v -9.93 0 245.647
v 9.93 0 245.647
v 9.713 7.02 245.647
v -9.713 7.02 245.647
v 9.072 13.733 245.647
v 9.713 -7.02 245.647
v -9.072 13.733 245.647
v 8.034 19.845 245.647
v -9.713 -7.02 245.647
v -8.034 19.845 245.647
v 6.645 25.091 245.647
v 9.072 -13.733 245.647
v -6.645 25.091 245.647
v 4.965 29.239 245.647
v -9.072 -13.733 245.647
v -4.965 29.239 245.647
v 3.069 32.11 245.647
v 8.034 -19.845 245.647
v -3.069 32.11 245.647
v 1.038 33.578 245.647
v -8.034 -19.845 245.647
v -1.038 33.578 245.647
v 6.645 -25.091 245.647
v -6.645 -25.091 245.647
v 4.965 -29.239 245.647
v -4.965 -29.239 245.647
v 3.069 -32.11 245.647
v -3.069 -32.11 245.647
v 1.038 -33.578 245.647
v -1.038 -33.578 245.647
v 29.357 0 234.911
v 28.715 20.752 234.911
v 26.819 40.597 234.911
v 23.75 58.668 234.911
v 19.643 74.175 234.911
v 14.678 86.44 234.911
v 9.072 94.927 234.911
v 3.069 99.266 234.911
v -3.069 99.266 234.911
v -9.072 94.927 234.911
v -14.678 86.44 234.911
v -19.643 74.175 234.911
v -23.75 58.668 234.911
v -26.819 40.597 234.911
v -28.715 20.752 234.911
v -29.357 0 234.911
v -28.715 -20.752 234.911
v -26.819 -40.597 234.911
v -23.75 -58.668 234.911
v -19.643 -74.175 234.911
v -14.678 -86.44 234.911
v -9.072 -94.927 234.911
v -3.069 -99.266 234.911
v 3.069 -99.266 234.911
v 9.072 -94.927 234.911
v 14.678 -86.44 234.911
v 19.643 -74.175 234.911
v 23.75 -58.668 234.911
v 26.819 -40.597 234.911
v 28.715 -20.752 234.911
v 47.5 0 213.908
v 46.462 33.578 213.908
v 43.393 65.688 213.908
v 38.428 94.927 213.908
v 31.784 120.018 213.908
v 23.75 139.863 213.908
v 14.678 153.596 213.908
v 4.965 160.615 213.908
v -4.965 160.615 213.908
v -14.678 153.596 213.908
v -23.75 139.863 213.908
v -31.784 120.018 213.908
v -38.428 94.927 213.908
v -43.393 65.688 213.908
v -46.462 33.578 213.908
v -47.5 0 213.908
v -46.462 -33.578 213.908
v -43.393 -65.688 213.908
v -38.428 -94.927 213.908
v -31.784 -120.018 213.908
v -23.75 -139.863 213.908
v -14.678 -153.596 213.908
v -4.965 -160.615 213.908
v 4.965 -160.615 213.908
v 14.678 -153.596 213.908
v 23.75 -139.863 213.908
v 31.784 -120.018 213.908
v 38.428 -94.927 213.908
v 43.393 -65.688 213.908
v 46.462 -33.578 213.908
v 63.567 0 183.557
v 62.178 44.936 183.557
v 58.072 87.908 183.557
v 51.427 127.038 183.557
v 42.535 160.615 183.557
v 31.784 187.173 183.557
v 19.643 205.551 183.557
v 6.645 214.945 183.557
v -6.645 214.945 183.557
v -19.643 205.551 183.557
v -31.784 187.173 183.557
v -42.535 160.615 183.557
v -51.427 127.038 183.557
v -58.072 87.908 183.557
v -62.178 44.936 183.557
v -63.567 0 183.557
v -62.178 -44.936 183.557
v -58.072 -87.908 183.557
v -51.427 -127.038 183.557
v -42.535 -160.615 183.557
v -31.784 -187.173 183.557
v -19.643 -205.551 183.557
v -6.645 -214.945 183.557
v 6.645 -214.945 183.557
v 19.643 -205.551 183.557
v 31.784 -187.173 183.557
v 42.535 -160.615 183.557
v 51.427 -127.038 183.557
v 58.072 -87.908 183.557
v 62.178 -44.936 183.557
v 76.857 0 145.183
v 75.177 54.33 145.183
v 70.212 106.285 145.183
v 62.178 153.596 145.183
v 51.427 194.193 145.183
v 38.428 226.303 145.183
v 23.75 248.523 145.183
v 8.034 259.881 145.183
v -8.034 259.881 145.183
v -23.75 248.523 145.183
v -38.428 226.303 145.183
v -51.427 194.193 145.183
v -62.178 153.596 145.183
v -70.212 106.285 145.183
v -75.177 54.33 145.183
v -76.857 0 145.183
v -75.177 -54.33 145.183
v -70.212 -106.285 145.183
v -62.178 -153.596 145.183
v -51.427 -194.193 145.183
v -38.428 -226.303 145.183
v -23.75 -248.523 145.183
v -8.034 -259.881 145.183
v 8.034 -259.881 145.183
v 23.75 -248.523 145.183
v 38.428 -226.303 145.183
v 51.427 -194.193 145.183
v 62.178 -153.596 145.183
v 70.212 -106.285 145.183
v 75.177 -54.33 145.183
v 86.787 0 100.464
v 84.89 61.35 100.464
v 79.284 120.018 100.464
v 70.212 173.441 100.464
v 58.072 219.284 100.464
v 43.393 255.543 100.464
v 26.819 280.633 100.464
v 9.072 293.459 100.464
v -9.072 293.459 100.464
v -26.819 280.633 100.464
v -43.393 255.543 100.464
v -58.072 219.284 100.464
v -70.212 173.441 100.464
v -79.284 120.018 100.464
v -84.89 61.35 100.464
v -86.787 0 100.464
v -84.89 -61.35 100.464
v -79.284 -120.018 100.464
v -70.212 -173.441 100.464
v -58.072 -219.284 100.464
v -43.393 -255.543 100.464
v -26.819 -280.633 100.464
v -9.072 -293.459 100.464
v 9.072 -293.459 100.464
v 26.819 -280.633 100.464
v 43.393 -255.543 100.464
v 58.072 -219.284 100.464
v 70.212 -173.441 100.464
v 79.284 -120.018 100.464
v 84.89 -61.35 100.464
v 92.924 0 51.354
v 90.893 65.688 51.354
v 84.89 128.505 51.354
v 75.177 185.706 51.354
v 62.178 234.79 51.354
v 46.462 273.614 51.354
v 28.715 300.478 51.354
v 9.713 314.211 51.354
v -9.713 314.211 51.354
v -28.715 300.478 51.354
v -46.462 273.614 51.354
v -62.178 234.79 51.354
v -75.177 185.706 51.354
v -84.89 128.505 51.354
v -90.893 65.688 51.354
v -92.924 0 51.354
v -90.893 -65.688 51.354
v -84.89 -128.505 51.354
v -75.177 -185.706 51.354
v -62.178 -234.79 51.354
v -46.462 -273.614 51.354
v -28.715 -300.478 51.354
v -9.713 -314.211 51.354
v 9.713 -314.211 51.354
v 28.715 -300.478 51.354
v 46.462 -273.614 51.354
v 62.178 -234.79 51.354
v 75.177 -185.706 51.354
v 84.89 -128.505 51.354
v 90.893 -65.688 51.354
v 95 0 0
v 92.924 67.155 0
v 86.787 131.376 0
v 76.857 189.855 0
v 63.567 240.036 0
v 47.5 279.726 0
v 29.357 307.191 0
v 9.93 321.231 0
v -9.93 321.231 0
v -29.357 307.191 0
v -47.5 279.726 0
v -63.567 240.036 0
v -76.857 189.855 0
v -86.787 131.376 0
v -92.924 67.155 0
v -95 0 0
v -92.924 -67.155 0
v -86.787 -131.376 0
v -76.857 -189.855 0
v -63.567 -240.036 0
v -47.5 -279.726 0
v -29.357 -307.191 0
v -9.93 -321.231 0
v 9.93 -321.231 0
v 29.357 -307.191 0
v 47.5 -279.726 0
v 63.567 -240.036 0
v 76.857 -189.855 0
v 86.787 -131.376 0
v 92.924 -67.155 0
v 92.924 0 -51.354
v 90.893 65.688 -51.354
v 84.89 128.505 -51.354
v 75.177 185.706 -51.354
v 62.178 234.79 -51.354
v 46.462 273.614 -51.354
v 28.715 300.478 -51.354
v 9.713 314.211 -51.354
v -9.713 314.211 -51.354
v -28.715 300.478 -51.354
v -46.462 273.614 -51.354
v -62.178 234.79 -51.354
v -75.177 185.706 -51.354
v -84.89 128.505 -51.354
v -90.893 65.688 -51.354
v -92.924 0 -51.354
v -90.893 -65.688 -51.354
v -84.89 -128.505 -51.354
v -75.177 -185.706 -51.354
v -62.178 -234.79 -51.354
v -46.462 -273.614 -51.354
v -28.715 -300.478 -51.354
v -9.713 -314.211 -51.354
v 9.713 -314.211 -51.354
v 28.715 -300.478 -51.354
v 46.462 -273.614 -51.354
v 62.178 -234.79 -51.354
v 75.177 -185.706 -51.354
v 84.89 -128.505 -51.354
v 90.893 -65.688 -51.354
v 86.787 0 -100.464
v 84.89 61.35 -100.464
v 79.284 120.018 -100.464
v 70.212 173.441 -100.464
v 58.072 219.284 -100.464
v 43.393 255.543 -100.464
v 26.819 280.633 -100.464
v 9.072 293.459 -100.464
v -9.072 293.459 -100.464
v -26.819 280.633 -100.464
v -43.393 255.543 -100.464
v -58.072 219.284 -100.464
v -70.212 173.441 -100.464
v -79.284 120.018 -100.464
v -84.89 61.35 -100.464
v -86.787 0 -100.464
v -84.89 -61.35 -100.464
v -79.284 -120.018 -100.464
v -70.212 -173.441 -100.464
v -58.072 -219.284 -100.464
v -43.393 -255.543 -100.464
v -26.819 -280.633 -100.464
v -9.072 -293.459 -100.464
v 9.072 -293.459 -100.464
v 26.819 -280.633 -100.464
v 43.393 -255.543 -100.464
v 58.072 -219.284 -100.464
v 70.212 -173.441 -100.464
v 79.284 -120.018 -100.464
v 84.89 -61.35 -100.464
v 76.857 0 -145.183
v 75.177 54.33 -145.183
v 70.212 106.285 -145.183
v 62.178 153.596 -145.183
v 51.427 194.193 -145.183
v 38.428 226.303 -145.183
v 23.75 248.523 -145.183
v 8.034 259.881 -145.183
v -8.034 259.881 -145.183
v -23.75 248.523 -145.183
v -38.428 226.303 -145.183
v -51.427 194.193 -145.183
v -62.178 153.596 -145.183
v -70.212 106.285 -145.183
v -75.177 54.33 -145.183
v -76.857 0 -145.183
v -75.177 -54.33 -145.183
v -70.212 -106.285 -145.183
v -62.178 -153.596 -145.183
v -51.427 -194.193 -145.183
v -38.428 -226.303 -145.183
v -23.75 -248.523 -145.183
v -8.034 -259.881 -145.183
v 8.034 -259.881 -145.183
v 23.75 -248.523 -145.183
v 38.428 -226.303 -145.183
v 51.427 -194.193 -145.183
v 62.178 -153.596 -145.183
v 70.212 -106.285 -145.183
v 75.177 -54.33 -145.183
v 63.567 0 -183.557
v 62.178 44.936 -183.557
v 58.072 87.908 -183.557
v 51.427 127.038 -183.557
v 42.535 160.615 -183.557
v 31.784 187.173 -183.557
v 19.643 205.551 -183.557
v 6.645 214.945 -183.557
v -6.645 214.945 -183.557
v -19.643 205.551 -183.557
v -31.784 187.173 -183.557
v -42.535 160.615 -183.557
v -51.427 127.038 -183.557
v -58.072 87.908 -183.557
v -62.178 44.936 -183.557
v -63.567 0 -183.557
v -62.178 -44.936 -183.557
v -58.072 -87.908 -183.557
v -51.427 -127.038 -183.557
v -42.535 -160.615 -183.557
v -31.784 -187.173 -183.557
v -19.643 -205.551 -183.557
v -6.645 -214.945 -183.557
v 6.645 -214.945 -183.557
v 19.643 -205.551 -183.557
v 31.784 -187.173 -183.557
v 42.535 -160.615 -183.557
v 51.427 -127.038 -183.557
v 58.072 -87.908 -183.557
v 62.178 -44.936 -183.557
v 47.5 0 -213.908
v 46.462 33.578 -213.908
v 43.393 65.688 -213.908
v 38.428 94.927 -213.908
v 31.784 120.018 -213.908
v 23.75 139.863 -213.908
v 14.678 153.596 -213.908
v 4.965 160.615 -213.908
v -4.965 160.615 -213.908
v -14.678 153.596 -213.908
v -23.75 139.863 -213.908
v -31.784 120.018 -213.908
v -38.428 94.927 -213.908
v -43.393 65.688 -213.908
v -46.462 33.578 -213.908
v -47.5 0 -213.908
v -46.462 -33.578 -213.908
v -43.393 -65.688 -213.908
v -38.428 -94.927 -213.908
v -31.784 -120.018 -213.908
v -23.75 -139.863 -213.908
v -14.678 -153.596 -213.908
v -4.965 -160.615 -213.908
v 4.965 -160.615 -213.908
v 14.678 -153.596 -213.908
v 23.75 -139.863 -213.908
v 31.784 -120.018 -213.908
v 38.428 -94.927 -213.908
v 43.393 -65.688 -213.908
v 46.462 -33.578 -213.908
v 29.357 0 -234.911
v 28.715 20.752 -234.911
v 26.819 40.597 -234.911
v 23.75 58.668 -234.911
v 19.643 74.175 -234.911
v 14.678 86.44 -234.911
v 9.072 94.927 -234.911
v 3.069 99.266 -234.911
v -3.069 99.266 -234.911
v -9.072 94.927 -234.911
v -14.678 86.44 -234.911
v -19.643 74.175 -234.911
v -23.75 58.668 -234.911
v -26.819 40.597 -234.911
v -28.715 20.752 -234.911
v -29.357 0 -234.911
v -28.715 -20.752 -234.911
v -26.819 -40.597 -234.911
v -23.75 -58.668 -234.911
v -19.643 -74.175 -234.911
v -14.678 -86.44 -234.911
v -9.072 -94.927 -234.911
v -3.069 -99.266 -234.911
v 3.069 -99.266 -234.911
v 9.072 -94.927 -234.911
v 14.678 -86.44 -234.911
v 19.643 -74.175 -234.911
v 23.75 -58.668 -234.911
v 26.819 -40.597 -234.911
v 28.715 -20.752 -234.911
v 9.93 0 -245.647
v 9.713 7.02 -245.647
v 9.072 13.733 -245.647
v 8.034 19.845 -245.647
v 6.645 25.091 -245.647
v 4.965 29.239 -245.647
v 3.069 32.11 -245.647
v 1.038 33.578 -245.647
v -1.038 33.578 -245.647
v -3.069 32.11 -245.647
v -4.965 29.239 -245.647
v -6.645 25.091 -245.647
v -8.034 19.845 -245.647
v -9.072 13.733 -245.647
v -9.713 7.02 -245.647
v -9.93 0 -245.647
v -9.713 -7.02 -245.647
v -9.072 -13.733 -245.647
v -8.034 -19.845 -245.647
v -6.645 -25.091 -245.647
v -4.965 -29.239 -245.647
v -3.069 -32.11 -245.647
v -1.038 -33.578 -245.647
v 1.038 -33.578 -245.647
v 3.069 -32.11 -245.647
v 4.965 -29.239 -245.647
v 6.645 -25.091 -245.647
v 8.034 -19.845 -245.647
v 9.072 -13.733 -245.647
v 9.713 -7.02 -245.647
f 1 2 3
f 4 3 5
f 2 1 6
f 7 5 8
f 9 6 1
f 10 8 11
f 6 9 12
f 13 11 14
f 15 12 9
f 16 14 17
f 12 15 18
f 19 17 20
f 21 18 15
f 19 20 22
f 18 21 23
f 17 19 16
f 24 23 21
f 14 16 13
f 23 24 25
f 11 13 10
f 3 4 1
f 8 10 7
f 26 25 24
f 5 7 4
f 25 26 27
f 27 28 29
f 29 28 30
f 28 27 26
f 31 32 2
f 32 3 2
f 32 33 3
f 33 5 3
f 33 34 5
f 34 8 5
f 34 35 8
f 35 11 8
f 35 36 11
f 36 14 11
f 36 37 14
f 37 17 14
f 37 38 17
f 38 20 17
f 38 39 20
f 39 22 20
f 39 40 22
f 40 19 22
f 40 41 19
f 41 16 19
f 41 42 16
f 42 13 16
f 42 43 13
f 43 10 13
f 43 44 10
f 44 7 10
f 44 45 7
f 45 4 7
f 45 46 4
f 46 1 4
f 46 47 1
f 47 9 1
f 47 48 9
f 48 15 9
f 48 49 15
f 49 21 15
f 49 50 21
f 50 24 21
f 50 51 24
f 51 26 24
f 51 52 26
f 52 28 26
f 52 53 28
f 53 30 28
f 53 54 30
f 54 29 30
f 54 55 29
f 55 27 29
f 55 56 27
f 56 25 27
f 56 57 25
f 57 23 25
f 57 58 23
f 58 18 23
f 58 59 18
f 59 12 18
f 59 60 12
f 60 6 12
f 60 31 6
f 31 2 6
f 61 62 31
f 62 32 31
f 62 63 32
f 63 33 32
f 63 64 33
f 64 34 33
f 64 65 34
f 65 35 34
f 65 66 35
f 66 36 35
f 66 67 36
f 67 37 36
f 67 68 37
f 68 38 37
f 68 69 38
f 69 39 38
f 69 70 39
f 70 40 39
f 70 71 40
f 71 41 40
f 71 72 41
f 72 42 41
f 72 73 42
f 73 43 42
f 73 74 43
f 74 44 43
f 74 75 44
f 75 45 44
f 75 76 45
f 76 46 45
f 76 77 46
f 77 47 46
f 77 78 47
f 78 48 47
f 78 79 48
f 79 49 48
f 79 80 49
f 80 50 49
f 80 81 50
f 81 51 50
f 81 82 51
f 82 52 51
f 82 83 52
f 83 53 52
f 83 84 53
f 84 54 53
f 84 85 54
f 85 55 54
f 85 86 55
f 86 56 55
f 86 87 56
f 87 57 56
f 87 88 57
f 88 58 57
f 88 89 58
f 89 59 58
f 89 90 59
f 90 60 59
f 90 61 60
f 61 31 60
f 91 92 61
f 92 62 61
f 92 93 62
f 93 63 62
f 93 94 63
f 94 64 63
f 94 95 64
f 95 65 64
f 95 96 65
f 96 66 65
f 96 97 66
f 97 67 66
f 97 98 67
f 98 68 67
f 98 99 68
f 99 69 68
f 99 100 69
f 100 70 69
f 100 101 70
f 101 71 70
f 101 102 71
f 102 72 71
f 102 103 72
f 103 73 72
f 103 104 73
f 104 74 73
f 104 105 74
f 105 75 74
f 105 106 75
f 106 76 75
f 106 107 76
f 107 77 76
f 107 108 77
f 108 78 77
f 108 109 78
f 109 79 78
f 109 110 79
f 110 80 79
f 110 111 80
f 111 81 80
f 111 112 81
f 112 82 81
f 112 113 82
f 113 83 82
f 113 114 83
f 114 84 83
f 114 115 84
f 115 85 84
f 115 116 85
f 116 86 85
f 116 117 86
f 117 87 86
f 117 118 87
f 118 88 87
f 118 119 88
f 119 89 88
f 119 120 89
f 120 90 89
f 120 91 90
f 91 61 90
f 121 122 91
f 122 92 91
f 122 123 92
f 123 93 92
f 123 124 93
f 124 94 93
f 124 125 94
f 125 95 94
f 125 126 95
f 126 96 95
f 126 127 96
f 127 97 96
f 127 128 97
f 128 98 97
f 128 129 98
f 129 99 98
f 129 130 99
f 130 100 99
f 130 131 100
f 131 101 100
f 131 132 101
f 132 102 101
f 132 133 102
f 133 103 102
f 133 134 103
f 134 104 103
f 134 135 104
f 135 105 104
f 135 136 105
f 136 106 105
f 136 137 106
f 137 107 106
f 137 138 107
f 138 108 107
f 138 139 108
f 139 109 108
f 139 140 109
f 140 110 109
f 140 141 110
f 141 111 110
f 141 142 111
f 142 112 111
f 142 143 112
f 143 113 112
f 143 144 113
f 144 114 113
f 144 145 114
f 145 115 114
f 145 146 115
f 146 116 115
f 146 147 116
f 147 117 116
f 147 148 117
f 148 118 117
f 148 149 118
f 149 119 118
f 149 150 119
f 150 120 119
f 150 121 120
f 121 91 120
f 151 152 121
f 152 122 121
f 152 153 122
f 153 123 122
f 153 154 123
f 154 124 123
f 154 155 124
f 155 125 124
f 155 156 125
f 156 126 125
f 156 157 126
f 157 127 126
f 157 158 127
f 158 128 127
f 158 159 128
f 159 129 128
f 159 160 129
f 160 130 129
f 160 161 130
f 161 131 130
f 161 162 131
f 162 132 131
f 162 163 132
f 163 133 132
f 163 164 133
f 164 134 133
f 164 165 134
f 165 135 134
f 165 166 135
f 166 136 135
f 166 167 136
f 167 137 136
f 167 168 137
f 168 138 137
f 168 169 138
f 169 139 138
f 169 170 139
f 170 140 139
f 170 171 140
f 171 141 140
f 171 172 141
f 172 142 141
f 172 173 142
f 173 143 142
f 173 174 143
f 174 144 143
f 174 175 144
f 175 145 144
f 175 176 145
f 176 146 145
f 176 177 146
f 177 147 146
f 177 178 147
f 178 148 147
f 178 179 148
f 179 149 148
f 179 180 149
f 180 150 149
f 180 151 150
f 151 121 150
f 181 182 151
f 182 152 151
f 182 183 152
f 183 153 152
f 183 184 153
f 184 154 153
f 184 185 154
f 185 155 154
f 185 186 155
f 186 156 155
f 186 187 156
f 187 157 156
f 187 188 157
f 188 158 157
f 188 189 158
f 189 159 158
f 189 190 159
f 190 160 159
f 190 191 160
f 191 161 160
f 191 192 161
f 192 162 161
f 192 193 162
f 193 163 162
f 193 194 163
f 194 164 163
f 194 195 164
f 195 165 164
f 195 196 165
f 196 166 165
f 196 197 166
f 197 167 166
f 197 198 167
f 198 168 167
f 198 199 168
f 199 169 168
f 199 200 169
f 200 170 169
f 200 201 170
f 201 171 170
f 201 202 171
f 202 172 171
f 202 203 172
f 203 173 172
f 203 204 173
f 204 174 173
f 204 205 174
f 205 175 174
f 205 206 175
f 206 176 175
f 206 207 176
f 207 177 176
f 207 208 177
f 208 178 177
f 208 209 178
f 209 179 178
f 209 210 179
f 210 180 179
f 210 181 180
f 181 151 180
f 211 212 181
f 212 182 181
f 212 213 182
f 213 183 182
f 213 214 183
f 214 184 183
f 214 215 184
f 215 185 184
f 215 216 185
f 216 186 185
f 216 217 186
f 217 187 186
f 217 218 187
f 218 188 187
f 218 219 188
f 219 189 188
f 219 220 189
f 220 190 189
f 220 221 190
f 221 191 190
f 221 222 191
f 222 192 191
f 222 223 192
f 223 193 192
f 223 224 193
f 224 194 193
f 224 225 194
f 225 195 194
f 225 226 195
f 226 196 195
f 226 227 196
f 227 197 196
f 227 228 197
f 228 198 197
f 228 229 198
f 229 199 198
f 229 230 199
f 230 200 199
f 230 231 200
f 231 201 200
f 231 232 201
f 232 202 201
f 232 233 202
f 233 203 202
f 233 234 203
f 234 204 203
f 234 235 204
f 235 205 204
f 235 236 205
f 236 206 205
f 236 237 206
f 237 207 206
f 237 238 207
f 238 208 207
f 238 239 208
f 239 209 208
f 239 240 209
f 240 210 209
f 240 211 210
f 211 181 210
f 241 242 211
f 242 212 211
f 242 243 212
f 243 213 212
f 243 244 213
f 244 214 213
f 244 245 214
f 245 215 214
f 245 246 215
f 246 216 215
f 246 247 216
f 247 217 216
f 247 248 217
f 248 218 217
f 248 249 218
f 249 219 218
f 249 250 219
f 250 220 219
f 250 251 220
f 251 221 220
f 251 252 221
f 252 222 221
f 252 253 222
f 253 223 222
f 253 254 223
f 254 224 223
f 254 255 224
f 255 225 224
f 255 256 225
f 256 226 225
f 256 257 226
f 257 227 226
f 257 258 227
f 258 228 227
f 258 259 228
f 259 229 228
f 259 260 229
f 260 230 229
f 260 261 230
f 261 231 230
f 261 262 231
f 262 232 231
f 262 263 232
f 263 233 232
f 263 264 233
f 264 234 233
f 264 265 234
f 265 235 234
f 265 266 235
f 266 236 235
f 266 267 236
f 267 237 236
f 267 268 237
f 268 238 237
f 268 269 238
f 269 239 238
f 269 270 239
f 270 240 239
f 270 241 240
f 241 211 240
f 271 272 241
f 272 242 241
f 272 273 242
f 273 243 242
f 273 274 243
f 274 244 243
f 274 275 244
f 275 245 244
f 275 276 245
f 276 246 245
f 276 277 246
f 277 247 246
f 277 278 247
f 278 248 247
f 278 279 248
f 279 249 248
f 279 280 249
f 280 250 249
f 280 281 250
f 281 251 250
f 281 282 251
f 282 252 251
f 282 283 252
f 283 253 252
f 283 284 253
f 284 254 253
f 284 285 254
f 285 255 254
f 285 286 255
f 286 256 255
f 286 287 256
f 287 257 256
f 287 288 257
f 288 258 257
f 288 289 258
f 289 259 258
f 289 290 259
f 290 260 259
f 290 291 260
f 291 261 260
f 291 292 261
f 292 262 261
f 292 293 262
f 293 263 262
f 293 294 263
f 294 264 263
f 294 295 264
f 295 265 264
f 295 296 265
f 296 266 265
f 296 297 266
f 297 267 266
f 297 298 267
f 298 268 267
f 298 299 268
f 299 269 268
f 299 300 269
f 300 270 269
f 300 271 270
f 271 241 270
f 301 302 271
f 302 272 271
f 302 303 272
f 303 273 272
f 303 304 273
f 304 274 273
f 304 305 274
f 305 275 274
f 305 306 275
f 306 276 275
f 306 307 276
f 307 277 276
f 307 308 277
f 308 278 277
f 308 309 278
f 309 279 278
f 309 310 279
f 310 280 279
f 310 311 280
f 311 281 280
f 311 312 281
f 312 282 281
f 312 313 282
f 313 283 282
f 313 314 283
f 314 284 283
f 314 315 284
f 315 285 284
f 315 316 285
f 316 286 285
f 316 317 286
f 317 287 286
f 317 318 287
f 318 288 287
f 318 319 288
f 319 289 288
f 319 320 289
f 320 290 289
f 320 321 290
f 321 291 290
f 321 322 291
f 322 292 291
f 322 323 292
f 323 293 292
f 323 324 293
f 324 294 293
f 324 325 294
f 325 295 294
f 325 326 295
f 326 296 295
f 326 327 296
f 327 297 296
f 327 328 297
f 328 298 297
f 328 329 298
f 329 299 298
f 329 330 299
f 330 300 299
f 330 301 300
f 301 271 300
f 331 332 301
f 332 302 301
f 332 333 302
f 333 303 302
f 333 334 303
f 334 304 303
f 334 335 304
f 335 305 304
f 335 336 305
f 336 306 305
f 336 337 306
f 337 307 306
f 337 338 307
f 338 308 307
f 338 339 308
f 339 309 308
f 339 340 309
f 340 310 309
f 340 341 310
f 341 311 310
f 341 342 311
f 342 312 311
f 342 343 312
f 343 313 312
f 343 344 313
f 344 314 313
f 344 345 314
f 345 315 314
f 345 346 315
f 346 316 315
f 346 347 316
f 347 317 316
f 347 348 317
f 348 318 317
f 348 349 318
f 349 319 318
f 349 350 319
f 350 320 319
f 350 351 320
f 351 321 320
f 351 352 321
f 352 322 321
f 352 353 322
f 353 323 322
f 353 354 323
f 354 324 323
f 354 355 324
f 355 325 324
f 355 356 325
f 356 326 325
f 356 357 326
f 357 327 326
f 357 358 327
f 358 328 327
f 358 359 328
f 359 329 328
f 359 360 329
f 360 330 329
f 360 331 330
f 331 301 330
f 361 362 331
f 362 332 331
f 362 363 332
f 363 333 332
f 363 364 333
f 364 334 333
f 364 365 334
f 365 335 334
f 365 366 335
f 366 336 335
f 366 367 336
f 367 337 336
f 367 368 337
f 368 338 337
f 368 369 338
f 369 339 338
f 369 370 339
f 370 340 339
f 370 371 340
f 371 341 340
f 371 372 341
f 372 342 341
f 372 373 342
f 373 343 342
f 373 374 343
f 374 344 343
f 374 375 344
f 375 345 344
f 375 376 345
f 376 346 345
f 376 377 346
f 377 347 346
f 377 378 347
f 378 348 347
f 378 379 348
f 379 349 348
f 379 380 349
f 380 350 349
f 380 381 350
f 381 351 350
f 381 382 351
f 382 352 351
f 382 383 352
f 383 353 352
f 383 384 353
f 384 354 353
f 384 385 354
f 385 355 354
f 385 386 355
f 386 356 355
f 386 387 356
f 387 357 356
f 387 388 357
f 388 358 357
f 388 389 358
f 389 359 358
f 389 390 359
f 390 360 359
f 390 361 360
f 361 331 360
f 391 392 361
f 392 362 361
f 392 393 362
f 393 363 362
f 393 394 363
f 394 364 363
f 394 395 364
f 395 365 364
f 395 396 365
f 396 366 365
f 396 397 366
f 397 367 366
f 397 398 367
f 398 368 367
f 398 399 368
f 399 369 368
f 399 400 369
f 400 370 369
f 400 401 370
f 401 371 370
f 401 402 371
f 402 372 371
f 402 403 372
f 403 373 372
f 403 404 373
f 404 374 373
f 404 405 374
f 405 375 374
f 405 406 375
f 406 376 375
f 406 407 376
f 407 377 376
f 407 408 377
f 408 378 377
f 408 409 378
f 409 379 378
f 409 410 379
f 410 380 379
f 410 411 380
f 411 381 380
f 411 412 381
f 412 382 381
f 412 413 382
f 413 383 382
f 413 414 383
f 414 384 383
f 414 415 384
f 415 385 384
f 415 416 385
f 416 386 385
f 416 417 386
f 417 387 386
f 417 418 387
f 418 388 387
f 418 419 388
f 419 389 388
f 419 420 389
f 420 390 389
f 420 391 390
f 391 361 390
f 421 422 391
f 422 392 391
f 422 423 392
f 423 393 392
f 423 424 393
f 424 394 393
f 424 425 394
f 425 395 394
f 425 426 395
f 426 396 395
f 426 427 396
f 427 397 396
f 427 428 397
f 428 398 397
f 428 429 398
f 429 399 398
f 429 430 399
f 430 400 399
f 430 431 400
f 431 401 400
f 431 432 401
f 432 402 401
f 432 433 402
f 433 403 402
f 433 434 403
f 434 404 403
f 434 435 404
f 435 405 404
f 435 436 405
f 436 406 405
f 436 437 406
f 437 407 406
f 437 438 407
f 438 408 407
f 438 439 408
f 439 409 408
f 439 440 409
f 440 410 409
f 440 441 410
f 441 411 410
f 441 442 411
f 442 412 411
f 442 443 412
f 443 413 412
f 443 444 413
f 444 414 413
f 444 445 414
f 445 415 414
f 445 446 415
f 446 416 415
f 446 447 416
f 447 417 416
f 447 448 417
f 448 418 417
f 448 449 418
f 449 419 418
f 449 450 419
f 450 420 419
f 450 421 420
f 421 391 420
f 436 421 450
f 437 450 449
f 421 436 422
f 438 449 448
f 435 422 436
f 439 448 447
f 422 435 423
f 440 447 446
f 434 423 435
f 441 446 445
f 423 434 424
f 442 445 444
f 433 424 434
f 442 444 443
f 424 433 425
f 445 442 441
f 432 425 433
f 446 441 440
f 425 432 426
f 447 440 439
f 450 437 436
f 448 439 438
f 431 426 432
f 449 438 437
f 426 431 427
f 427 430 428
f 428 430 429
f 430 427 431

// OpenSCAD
// Generated by SolidPython 1.0.1 on 2020-07-29 00:46:47


scale(v = [5, 17, 13]) {
	sphere(r = 19);
}
/***********************************************
*********      SolidPython code:      **********
************************************************
 
# import packages: SolidPython
from solid import *
from solid.utils import *
from itertools import chain, combinations, permutations


class Resize:

    def __init__(self, scad_file):
        self.scad_file = scad_file
        #self.scad_file = import_scad(scad_file)
        # cone/cylinder param:
        self.r1 = 0
        self.r2 = 0
        self.h = 0
        # rectangular prism param:
        self.w = 0
        self.l = 0
        # ellipse param:
        self.r = 0

    # import OpenScad code (file name corresponds to shape)


    # classify shape + parameters
    def assign(self, param1, param2, param3):
        if self.scad_file == 'cone.scad':
            self.r1 = param1
            self.r2 = param2
            self.h = param3
        elif self.scad_file == 'cylinder.scad':
            self.r1 = param1
            self.r2 = param2
            self.h = param3
        elif self.scad_file == 'rectangularPrism.scad':
            self.h = param1
            self.l = param2
            self.w = param3
        else:
            self.r = param1
            self.h = param2

    # resize parameters
    def iterate(self):
        x = range(3, 20, 2)
        i = 1
        if self.scad_file == 'cone.scad':
            tempList = list(permutations(x, 2))
            for temp in tempList:
                param1 = temp[0]
                param2 = temp[1]
                filepath = 'produced_scad_files/' + 'cone' + str(param1) + '_' + str(param2) + '_' + '.scad'
                scad_render_to_file(cylinder(h=param1, r1=param2, r2=0), filepath)

        elif self.scad_file == 'cylinder.scad':
            tempList = list(permutations(x, 3))
            for temp in tempList:
                param1 = temp[0]
                param2 = temp[1]
                filepath = 'produced_scad_files/' + 'cylinder' + str(param1) + '_' + str(param2) + '_' + '.scad'
                scad_render_to_file(cylinder(h=param1, r1=param2, r2=param2), filepath)

        elif self.scad_file == 'rectangularPrism.scad':
            tempList = list(permutations(x, 3))
            for temp in tempList:
                param1 = temp[0]
                param2 = temp[1]
                param3 = temp[2]
                filepath = 'produced_scad_files/' + 'rectangularPrism' + str(param1) + '_' + str(param2) + '_' + str(
                    param3) + '.scad'
                scad_render_to_file(cube(size=(param1, param2, param3)), filepath)

        elif self.scad_file == 'ellipse.scad':
            tempList = list(permutations(x, 4))
            for temp in tempList:
                param1 = temp[0]
                param2 = temp[1]
                param3 = temp[2]
                param4 = temp[3]
                filepath = 'produced_scad_files/' + 'ellipse' + str(param1) + '_' + str(param2) + '_' + str(param3) + '_' + str(param4) + '.scad'
                scad_render_to_file(scale([param1, param2, param3])(sphere(r=param4)), filepath)

    def render_to_scadfile(self):
        scad_render_to_file(scad, 'example.scad') 
 
************************************************/
